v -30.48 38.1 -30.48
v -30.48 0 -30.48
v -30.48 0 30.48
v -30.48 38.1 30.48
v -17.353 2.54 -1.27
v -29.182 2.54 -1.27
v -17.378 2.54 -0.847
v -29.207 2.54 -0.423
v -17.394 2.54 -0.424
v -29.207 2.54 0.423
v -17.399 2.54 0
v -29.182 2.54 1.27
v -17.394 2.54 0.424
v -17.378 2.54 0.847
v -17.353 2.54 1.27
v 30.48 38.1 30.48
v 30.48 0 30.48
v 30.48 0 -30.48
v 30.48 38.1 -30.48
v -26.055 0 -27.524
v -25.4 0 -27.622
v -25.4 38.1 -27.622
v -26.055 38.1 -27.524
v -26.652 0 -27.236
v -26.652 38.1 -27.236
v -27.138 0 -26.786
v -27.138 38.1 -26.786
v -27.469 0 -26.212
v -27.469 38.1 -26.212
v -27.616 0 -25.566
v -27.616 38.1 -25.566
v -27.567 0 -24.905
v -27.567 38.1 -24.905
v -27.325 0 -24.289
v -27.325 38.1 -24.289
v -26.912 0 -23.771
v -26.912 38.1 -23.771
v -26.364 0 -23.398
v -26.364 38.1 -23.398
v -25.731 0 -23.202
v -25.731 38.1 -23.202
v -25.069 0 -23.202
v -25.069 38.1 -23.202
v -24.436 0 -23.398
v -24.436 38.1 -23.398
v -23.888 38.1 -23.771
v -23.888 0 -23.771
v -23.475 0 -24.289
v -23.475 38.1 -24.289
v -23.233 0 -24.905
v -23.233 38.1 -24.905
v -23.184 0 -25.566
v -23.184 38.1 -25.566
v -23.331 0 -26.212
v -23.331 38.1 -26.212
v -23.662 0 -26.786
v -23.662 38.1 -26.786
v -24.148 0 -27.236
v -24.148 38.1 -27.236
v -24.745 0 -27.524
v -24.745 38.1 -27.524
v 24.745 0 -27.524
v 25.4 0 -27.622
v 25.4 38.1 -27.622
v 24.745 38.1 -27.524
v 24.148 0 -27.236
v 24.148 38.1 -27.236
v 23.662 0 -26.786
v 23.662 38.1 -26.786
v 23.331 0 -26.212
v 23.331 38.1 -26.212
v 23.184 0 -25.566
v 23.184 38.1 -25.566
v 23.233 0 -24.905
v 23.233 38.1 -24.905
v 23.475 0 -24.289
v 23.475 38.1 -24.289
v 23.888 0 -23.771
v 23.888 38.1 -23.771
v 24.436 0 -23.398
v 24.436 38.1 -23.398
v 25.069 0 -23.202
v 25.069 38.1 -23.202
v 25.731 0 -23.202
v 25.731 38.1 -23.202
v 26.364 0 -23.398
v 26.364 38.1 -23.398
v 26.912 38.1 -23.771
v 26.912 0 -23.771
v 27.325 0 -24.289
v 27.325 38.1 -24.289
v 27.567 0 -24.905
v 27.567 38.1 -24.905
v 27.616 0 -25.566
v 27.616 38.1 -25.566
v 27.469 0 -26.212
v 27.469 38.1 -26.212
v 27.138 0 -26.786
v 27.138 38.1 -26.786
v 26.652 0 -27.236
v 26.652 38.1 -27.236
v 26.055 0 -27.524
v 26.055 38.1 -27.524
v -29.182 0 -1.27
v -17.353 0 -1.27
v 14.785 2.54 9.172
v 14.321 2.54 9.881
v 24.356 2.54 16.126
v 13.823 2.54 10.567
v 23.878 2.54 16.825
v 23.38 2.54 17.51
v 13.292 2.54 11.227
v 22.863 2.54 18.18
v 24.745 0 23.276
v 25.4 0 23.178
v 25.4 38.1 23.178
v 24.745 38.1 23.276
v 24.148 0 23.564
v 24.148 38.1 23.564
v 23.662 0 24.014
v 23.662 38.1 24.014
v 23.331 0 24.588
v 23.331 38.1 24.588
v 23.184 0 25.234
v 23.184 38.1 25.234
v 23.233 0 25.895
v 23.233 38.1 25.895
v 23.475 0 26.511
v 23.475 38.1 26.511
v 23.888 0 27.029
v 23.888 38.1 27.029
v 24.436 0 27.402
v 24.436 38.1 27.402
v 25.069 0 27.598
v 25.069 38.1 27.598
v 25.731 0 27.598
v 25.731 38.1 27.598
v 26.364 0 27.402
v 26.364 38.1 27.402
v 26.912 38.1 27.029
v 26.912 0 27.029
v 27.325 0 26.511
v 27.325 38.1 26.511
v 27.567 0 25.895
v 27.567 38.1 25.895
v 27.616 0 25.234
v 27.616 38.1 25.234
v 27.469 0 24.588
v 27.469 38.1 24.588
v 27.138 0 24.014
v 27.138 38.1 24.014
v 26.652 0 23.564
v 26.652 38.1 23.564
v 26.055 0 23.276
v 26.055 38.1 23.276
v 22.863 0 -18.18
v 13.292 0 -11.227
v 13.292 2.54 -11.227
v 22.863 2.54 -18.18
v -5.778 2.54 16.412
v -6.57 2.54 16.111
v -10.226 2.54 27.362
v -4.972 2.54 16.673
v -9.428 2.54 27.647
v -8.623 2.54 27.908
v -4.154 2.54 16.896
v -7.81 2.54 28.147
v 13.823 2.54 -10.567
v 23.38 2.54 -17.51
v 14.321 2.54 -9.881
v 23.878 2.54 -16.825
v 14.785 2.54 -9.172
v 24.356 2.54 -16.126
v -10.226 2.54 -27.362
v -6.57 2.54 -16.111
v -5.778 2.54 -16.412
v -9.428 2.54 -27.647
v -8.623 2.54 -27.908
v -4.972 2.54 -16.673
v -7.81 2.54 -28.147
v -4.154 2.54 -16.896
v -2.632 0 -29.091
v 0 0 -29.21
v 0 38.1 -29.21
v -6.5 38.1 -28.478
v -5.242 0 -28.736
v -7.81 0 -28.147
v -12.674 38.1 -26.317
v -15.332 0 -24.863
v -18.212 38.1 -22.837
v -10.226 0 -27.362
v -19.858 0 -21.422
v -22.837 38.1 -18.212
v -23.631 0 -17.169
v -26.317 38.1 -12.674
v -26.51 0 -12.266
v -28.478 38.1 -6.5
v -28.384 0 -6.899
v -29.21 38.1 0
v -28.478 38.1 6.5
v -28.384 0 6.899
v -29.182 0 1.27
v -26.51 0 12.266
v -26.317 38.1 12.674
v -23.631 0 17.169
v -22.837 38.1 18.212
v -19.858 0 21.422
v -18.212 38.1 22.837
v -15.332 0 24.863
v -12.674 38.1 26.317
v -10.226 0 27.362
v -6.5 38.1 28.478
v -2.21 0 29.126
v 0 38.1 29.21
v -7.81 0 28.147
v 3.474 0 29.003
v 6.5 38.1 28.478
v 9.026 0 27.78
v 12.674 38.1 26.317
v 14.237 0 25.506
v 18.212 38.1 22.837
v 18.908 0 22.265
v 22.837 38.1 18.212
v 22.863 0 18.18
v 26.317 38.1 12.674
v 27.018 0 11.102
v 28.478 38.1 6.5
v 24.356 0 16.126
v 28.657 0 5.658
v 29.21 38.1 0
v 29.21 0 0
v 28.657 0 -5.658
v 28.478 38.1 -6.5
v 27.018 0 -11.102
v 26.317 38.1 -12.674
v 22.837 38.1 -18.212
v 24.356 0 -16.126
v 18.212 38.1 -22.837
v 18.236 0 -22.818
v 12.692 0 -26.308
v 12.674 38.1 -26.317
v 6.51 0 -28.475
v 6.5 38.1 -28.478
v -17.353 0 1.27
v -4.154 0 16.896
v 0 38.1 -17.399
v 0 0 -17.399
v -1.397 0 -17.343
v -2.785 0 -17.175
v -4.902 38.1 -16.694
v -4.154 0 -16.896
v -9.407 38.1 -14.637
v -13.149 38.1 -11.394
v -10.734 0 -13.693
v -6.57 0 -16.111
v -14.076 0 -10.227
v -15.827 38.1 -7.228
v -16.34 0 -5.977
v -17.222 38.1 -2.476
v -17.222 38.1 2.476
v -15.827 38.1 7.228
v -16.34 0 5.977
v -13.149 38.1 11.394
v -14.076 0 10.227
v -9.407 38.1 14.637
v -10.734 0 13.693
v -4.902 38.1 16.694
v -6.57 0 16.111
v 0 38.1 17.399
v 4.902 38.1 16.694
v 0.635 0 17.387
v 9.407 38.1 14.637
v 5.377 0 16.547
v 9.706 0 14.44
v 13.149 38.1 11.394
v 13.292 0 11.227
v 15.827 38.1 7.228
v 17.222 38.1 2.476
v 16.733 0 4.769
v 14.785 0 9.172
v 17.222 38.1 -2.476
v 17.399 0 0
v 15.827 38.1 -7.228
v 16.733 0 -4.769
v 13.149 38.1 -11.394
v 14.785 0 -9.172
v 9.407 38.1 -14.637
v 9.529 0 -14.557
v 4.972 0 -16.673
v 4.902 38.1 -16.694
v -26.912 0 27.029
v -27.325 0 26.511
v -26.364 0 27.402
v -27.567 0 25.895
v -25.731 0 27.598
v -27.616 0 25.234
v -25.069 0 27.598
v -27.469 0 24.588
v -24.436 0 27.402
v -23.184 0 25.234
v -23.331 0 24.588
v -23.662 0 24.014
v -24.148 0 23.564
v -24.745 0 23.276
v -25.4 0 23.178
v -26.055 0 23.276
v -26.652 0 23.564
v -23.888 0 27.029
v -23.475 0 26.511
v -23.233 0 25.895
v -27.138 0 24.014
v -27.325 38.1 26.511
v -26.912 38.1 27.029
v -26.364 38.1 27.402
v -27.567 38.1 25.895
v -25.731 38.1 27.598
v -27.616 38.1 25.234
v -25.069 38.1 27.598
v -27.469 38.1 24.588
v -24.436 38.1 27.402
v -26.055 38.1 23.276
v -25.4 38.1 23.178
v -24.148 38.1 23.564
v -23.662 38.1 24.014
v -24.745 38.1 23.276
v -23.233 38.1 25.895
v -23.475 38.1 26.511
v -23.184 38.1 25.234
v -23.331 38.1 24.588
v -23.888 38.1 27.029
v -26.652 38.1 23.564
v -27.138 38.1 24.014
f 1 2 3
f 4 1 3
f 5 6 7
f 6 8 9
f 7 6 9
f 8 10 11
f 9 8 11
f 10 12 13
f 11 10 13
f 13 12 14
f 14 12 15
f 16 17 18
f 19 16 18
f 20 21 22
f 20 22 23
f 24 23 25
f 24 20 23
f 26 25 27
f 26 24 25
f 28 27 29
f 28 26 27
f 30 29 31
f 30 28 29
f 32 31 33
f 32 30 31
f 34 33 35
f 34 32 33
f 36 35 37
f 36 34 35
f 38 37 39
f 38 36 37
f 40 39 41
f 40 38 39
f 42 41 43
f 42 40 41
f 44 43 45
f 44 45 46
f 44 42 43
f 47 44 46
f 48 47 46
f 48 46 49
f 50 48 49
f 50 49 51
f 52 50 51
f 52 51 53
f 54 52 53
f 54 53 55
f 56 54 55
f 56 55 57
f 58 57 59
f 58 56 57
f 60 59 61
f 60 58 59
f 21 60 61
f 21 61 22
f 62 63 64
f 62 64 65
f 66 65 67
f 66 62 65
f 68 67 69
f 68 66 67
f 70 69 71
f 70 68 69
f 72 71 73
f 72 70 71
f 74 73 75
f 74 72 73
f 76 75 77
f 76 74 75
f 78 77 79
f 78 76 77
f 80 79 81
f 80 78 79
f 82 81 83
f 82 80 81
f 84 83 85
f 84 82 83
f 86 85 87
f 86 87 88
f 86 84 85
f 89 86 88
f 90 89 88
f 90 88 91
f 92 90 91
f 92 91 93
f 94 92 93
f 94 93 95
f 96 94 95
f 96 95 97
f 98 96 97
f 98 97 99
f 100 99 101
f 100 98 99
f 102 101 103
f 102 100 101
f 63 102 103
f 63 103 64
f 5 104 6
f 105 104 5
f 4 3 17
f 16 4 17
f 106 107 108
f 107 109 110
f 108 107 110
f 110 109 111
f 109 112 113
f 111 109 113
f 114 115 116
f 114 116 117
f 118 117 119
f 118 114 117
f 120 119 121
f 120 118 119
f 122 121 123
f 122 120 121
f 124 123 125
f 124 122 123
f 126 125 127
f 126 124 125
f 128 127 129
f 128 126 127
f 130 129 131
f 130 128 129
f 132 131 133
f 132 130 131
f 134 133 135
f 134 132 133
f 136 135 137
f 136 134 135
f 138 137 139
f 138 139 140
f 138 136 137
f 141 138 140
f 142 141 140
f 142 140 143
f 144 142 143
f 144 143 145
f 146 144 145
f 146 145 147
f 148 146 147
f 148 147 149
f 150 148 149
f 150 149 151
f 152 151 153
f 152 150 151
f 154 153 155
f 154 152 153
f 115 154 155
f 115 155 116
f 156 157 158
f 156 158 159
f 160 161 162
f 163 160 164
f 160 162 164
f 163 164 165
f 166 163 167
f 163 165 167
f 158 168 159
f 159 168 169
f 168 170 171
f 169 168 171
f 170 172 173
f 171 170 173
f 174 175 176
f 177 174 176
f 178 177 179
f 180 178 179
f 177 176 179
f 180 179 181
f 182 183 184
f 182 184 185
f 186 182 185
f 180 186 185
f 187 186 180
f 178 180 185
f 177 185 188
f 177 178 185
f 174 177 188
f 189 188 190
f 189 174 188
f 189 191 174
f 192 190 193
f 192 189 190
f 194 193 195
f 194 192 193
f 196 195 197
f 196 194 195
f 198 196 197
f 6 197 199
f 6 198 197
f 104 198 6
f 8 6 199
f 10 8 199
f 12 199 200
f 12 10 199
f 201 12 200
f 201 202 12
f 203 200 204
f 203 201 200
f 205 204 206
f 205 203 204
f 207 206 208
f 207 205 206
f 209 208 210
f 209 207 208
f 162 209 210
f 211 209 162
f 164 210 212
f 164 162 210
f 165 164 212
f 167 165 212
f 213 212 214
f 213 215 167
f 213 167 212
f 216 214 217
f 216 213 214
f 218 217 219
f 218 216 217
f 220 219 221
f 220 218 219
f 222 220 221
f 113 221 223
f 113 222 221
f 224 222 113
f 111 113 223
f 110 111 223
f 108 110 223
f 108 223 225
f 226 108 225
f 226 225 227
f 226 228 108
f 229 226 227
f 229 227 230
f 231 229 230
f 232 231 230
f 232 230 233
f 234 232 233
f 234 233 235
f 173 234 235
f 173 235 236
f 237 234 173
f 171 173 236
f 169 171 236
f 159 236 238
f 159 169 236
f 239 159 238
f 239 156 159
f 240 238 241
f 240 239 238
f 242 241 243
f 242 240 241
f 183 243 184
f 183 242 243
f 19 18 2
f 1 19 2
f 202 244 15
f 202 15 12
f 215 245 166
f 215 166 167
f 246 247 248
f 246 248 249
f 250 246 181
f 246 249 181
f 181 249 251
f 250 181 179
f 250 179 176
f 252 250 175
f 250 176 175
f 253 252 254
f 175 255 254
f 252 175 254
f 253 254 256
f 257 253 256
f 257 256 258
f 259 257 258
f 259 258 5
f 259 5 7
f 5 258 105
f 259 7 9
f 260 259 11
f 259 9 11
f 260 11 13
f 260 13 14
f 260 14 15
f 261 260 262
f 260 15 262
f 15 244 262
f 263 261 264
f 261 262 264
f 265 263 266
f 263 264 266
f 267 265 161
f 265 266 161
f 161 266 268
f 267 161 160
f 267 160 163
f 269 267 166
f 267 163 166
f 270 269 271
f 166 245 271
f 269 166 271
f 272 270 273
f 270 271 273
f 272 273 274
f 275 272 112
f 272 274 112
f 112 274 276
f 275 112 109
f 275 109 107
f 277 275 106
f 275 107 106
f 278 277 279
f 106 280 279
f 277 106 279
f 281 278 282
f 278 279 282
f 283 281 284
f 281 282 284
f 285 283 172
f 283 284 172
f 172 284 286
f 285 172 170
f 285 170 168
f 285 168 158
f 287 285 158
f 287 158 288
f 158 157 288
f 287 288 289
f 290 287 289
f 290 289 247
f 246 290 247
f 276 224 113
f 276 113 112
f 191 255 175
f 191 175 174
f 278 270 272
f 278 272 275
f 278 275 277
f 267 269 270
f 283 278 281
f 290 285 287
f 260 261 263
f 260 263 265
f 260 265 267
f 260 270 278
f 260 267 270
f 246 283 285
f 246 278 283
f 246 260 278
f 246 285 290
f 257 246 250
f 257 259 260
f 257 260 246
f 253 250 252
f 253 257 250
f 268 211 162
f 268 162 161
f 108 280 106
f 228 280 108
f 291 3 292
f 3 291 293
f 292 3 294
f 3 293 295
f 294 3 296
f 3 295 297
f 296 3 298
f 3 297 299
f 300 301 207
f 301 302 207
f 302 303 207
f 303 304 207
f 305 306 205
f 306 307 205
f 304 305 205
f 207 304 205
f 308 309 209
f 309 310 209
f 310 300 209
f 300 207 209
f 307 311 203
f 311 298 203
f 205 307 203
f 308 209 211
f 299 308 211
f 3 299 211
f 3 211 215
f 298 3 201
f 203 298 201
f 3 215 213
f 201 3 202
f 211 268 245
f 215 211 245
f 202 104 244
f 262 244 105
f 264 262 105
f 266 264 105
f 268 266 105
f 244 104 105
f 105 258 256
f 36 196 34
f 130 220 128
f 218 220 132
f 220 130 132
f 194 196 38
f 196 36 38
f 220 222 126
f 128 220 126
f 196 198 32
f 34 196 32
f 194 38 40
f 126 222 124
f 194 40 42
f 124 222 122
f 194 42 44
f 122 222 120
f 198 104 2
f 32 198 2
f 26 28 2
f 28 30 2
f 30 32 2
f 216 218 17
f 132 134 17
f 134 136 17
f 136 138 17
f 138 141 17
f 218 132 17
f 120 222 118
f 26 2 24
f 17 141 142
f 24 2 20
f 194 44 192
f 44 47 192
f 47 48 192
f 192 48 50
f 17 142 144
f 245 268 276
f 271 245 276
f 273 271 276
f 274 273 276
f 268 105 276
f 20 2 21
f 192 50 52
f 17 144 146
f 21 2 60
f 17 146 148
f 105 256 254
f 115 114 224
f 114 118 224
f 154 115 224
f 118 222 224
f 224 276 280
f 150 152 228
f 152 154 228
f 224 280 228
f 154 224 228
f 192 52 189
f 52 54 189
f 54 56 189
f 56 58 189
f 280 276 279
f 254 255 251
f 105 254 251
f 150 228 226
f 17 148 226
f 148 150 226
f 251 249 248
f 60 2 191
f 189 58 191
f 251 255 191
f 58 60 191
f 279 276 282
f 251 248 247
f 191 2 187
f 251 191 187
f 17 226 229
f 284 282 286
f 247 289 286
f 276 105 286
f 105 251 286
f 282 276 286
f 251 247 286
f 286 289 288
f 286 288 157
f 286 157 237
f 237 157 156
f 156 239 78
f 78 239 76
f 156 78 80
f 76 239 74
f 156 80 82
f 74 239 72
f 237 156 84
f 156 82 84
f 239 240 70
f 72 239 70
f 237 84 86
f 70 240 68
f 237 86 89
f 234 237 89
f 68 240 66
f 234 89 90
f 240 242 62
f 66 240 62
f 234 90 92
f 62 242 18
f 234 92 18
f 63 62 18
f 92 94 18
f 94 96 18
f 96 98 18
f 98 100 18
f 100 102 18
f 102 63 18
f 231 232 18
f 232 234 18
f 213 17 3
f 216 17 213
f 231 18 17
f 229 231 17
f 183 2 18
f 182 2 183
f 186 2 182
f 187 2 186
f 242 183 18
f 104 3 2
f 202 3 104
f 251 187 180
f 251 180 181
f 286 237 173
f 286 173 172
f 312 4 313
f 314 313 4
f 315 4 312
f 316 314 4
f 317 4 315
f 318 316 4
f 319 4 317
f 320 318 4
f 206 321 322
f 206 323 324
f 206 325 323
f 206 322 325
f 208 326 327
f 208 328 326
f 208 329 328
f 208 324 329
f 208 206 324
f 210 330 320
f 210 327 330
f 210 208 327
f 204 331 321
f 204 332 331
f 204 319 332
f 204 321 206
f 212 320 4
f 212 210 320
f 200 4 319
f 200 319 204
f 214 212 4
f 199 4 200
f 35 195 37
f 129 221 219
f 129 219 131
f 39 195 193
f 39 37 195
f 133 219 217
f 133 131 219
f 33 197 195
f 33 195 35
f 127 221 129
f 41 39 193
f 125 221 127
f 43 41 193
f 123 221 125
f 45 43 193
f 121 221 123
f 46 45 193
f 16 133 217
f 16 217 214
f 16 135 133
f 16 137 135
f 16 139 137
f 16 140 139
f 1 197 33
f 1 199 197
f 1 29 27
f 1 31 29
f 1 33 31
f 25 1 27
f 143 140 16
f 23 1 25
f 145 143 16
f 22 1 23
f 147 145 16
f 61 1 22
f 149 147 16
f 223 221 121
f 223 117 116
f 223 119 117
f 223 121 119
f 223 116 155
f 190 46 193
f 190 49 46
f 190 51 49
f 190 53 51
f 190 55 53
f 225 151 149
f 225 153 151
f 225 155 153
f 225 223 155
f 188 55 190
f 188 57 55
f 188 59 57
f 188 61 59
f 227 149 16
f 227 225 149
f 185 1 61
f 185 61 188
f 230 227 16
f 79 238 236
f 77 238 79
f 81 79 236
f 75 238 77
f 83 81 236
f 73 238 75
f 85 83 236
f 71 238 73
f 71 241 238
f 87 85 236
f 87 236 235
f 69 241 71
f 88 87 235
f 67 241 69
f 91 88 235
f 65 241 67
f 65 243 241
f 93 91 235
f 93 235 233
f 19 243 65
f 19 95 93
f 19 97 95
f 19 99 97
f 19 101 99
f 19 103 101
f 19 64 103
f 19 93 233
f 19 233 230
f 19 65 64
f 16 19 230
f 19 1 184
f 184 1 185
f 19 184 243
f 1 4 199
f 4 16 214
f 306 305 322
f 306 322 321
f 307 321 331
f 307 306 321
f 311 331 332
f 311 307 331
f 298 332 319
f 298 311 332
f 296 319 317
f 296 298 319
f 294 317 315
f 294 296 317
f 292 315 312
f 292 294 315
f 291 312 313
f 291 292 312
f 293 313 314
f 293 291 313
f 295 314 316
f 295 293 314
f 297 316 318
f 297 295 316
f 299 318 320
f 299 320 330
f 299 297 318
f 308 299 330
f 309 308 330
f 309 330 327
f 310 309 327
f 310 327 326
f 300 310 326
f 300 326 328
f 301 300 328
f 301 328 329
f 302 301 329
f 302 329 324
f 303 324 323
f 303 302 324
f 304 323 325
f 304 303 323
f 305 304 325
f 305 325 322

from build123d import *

# Parameters (mm, degrees)
SKETCH1_R             = 17.399
BOSS_EXTRUDE1_DEPTH   = 38.1
SKETCH1_R_2           = 29.21
SKETCH1_R_3           = 2.2225
BOSS_EXTRUDE1_2_DEPTH = 38.1
BOSS_EXTRUDE2_DEPTH   = 2.54


with BuildPart() as part:
    # Sketch1 → Boss-Extrude1 (new body)
    with BuildSketch(Plane(origin=(0, 0, 0), x_dir=(1, 0, 0), z_dir=(0, 1, 0))):
        with Locations(Location((0, 0, 0), (0, 0, 90))):
            Circle(SKETCH1_R)
    extrude(amount=BOSS_EXTRUDE1_DEPTH)



with BuildPart() as body_2:
    # Sketch1 → Boss-Extrude1 2 (new body)
    with BuildSketch(Plane(origin=(0, 0, 0), x_dir=(1, 0, 0), z_dir=(0, 1, 0))):
        Polygon((0, -30.48), (30.48, -30.48), (30.48, 30.48), (-30.48, 30.48), (-30.48, -30.48), align=None)
        with Locations(Location((0, 0, 0), (0, 0, 90))):
            Circle(SKETCH1_R_2, mode=Mode.SUBTRACT)
        with Locations(Location((-25.4, 25.4, 0), (0, 0, 90))):
            Circle(SKETCH1_R_3, mode=Mode.SUBTRACT)
        with Locations(Location((-25.4, -25.4, 0), (0, 0, 90))):
            Circle(SKETCH1_R_3, mode=Mode.SUBTRACT)
        with Locations(Location((25.4, -25.4, 0), (0, 0, 90))):
            Circle(SKETCH1_R_3, mode=Mode.SUBTRACT)
        with Locations(Location((25.4, 25.4, 0), (0, 0, 90))):
            Circle(SKETCH1_R_3, mode=Mode.SUBTRACT)
    extrude(amount=BOSS_EXTRUDE1_2_DEPTH)


with BuildPart() as part_1:
    add(part.part)

    add(body_2.part)  # Boss-Extrude2 merges body 2
    # Sketch2 → Boss-Extrude2 (add)
    with BuildSketch(Plane.XZ):
        with BuildLine():
            Line((-10.626679764, 28.595751034), (-6.570086281, 16.110840054))
            ThreePointArc((-6.570086281, 16.110840054), (-5.376586685, 16.547432327), (-4.15440273, 16.89574322))
            Line((-4.15440273, 16.89574322), (-8.210996213, 29.3806542))
            Line((-8.210996213, 29.3806542), (-10.626679764, 28.595751034))
        make_face()
        with BuildLine():
            Line((23.912350718, 18.943146073), (13.292051101, 11.227046741))
            ThreePointArc((13.292051101, 11.227046741), (14.076086685, 10.226875605), (14.785025642, 9.172143575))
            Line((14.785025642, 9.172143575), (25.405325259, 16.888242907))
            Line((25.405325259, 16.888242907), (23.912350718, 18.943146073))
        make_face()
        with BuildLine():
            ThreePointArc((14.785025642, -9.172143575), (14.076086685, -10.226875605), (13.292051101, -11.227046741))
            Line((13.292051101, -11.227046741), (23.912350718, -18.943146073))
            Line((23.912350718, -18.943146073), (25.405325259, -16.888242907))
            Line((25.405325259, -16.888242907), (14.785025642, -9.172143575))
        make_face()
        with BuildLine():
            ThreePointArc((-4.15440273, -16.89574322), (-5.376586685, -16.547432327), (-6.570086281, -16.110840054))
            Line((-6.570086281, -16.110840054), (-10.626679764, -28.595751034))
            Line((-10.626679764, -28.595751034), (-8.210996213, -29.3806542))
            Line((-8.210996213, -29.3806542), (-4.15440273, -16.89574322))
        make_face()
        with BuildLine():
            ThreePointArc((-17.352587732, -1.27), (-17.387393062, -0.635423894), (-17.399, 0))
            Line((-17.399, 0), (-30.48, 0))
            Line((-30.48, 0), (-30.48, -1.27))
            Line((-30.48, -1.27), (-17.352587732, -1.27))
        make_face()
        with BuildLine():
            Line((-30.48, 0), (-17.399, 0))
            ThreePointArc((-17.399, 0), (-17.387393062, 0.635423894), (-17.352587732, 1.27))
            Line((-17.352587732, 1.27), (-30.48, 1.27))
            Line((-30.48, 1.27), (-30.48, 0))
        make_face()
    extrude(amount=-BOSS_EXTRUDE2_DEPTH)


solid = part_1.part
